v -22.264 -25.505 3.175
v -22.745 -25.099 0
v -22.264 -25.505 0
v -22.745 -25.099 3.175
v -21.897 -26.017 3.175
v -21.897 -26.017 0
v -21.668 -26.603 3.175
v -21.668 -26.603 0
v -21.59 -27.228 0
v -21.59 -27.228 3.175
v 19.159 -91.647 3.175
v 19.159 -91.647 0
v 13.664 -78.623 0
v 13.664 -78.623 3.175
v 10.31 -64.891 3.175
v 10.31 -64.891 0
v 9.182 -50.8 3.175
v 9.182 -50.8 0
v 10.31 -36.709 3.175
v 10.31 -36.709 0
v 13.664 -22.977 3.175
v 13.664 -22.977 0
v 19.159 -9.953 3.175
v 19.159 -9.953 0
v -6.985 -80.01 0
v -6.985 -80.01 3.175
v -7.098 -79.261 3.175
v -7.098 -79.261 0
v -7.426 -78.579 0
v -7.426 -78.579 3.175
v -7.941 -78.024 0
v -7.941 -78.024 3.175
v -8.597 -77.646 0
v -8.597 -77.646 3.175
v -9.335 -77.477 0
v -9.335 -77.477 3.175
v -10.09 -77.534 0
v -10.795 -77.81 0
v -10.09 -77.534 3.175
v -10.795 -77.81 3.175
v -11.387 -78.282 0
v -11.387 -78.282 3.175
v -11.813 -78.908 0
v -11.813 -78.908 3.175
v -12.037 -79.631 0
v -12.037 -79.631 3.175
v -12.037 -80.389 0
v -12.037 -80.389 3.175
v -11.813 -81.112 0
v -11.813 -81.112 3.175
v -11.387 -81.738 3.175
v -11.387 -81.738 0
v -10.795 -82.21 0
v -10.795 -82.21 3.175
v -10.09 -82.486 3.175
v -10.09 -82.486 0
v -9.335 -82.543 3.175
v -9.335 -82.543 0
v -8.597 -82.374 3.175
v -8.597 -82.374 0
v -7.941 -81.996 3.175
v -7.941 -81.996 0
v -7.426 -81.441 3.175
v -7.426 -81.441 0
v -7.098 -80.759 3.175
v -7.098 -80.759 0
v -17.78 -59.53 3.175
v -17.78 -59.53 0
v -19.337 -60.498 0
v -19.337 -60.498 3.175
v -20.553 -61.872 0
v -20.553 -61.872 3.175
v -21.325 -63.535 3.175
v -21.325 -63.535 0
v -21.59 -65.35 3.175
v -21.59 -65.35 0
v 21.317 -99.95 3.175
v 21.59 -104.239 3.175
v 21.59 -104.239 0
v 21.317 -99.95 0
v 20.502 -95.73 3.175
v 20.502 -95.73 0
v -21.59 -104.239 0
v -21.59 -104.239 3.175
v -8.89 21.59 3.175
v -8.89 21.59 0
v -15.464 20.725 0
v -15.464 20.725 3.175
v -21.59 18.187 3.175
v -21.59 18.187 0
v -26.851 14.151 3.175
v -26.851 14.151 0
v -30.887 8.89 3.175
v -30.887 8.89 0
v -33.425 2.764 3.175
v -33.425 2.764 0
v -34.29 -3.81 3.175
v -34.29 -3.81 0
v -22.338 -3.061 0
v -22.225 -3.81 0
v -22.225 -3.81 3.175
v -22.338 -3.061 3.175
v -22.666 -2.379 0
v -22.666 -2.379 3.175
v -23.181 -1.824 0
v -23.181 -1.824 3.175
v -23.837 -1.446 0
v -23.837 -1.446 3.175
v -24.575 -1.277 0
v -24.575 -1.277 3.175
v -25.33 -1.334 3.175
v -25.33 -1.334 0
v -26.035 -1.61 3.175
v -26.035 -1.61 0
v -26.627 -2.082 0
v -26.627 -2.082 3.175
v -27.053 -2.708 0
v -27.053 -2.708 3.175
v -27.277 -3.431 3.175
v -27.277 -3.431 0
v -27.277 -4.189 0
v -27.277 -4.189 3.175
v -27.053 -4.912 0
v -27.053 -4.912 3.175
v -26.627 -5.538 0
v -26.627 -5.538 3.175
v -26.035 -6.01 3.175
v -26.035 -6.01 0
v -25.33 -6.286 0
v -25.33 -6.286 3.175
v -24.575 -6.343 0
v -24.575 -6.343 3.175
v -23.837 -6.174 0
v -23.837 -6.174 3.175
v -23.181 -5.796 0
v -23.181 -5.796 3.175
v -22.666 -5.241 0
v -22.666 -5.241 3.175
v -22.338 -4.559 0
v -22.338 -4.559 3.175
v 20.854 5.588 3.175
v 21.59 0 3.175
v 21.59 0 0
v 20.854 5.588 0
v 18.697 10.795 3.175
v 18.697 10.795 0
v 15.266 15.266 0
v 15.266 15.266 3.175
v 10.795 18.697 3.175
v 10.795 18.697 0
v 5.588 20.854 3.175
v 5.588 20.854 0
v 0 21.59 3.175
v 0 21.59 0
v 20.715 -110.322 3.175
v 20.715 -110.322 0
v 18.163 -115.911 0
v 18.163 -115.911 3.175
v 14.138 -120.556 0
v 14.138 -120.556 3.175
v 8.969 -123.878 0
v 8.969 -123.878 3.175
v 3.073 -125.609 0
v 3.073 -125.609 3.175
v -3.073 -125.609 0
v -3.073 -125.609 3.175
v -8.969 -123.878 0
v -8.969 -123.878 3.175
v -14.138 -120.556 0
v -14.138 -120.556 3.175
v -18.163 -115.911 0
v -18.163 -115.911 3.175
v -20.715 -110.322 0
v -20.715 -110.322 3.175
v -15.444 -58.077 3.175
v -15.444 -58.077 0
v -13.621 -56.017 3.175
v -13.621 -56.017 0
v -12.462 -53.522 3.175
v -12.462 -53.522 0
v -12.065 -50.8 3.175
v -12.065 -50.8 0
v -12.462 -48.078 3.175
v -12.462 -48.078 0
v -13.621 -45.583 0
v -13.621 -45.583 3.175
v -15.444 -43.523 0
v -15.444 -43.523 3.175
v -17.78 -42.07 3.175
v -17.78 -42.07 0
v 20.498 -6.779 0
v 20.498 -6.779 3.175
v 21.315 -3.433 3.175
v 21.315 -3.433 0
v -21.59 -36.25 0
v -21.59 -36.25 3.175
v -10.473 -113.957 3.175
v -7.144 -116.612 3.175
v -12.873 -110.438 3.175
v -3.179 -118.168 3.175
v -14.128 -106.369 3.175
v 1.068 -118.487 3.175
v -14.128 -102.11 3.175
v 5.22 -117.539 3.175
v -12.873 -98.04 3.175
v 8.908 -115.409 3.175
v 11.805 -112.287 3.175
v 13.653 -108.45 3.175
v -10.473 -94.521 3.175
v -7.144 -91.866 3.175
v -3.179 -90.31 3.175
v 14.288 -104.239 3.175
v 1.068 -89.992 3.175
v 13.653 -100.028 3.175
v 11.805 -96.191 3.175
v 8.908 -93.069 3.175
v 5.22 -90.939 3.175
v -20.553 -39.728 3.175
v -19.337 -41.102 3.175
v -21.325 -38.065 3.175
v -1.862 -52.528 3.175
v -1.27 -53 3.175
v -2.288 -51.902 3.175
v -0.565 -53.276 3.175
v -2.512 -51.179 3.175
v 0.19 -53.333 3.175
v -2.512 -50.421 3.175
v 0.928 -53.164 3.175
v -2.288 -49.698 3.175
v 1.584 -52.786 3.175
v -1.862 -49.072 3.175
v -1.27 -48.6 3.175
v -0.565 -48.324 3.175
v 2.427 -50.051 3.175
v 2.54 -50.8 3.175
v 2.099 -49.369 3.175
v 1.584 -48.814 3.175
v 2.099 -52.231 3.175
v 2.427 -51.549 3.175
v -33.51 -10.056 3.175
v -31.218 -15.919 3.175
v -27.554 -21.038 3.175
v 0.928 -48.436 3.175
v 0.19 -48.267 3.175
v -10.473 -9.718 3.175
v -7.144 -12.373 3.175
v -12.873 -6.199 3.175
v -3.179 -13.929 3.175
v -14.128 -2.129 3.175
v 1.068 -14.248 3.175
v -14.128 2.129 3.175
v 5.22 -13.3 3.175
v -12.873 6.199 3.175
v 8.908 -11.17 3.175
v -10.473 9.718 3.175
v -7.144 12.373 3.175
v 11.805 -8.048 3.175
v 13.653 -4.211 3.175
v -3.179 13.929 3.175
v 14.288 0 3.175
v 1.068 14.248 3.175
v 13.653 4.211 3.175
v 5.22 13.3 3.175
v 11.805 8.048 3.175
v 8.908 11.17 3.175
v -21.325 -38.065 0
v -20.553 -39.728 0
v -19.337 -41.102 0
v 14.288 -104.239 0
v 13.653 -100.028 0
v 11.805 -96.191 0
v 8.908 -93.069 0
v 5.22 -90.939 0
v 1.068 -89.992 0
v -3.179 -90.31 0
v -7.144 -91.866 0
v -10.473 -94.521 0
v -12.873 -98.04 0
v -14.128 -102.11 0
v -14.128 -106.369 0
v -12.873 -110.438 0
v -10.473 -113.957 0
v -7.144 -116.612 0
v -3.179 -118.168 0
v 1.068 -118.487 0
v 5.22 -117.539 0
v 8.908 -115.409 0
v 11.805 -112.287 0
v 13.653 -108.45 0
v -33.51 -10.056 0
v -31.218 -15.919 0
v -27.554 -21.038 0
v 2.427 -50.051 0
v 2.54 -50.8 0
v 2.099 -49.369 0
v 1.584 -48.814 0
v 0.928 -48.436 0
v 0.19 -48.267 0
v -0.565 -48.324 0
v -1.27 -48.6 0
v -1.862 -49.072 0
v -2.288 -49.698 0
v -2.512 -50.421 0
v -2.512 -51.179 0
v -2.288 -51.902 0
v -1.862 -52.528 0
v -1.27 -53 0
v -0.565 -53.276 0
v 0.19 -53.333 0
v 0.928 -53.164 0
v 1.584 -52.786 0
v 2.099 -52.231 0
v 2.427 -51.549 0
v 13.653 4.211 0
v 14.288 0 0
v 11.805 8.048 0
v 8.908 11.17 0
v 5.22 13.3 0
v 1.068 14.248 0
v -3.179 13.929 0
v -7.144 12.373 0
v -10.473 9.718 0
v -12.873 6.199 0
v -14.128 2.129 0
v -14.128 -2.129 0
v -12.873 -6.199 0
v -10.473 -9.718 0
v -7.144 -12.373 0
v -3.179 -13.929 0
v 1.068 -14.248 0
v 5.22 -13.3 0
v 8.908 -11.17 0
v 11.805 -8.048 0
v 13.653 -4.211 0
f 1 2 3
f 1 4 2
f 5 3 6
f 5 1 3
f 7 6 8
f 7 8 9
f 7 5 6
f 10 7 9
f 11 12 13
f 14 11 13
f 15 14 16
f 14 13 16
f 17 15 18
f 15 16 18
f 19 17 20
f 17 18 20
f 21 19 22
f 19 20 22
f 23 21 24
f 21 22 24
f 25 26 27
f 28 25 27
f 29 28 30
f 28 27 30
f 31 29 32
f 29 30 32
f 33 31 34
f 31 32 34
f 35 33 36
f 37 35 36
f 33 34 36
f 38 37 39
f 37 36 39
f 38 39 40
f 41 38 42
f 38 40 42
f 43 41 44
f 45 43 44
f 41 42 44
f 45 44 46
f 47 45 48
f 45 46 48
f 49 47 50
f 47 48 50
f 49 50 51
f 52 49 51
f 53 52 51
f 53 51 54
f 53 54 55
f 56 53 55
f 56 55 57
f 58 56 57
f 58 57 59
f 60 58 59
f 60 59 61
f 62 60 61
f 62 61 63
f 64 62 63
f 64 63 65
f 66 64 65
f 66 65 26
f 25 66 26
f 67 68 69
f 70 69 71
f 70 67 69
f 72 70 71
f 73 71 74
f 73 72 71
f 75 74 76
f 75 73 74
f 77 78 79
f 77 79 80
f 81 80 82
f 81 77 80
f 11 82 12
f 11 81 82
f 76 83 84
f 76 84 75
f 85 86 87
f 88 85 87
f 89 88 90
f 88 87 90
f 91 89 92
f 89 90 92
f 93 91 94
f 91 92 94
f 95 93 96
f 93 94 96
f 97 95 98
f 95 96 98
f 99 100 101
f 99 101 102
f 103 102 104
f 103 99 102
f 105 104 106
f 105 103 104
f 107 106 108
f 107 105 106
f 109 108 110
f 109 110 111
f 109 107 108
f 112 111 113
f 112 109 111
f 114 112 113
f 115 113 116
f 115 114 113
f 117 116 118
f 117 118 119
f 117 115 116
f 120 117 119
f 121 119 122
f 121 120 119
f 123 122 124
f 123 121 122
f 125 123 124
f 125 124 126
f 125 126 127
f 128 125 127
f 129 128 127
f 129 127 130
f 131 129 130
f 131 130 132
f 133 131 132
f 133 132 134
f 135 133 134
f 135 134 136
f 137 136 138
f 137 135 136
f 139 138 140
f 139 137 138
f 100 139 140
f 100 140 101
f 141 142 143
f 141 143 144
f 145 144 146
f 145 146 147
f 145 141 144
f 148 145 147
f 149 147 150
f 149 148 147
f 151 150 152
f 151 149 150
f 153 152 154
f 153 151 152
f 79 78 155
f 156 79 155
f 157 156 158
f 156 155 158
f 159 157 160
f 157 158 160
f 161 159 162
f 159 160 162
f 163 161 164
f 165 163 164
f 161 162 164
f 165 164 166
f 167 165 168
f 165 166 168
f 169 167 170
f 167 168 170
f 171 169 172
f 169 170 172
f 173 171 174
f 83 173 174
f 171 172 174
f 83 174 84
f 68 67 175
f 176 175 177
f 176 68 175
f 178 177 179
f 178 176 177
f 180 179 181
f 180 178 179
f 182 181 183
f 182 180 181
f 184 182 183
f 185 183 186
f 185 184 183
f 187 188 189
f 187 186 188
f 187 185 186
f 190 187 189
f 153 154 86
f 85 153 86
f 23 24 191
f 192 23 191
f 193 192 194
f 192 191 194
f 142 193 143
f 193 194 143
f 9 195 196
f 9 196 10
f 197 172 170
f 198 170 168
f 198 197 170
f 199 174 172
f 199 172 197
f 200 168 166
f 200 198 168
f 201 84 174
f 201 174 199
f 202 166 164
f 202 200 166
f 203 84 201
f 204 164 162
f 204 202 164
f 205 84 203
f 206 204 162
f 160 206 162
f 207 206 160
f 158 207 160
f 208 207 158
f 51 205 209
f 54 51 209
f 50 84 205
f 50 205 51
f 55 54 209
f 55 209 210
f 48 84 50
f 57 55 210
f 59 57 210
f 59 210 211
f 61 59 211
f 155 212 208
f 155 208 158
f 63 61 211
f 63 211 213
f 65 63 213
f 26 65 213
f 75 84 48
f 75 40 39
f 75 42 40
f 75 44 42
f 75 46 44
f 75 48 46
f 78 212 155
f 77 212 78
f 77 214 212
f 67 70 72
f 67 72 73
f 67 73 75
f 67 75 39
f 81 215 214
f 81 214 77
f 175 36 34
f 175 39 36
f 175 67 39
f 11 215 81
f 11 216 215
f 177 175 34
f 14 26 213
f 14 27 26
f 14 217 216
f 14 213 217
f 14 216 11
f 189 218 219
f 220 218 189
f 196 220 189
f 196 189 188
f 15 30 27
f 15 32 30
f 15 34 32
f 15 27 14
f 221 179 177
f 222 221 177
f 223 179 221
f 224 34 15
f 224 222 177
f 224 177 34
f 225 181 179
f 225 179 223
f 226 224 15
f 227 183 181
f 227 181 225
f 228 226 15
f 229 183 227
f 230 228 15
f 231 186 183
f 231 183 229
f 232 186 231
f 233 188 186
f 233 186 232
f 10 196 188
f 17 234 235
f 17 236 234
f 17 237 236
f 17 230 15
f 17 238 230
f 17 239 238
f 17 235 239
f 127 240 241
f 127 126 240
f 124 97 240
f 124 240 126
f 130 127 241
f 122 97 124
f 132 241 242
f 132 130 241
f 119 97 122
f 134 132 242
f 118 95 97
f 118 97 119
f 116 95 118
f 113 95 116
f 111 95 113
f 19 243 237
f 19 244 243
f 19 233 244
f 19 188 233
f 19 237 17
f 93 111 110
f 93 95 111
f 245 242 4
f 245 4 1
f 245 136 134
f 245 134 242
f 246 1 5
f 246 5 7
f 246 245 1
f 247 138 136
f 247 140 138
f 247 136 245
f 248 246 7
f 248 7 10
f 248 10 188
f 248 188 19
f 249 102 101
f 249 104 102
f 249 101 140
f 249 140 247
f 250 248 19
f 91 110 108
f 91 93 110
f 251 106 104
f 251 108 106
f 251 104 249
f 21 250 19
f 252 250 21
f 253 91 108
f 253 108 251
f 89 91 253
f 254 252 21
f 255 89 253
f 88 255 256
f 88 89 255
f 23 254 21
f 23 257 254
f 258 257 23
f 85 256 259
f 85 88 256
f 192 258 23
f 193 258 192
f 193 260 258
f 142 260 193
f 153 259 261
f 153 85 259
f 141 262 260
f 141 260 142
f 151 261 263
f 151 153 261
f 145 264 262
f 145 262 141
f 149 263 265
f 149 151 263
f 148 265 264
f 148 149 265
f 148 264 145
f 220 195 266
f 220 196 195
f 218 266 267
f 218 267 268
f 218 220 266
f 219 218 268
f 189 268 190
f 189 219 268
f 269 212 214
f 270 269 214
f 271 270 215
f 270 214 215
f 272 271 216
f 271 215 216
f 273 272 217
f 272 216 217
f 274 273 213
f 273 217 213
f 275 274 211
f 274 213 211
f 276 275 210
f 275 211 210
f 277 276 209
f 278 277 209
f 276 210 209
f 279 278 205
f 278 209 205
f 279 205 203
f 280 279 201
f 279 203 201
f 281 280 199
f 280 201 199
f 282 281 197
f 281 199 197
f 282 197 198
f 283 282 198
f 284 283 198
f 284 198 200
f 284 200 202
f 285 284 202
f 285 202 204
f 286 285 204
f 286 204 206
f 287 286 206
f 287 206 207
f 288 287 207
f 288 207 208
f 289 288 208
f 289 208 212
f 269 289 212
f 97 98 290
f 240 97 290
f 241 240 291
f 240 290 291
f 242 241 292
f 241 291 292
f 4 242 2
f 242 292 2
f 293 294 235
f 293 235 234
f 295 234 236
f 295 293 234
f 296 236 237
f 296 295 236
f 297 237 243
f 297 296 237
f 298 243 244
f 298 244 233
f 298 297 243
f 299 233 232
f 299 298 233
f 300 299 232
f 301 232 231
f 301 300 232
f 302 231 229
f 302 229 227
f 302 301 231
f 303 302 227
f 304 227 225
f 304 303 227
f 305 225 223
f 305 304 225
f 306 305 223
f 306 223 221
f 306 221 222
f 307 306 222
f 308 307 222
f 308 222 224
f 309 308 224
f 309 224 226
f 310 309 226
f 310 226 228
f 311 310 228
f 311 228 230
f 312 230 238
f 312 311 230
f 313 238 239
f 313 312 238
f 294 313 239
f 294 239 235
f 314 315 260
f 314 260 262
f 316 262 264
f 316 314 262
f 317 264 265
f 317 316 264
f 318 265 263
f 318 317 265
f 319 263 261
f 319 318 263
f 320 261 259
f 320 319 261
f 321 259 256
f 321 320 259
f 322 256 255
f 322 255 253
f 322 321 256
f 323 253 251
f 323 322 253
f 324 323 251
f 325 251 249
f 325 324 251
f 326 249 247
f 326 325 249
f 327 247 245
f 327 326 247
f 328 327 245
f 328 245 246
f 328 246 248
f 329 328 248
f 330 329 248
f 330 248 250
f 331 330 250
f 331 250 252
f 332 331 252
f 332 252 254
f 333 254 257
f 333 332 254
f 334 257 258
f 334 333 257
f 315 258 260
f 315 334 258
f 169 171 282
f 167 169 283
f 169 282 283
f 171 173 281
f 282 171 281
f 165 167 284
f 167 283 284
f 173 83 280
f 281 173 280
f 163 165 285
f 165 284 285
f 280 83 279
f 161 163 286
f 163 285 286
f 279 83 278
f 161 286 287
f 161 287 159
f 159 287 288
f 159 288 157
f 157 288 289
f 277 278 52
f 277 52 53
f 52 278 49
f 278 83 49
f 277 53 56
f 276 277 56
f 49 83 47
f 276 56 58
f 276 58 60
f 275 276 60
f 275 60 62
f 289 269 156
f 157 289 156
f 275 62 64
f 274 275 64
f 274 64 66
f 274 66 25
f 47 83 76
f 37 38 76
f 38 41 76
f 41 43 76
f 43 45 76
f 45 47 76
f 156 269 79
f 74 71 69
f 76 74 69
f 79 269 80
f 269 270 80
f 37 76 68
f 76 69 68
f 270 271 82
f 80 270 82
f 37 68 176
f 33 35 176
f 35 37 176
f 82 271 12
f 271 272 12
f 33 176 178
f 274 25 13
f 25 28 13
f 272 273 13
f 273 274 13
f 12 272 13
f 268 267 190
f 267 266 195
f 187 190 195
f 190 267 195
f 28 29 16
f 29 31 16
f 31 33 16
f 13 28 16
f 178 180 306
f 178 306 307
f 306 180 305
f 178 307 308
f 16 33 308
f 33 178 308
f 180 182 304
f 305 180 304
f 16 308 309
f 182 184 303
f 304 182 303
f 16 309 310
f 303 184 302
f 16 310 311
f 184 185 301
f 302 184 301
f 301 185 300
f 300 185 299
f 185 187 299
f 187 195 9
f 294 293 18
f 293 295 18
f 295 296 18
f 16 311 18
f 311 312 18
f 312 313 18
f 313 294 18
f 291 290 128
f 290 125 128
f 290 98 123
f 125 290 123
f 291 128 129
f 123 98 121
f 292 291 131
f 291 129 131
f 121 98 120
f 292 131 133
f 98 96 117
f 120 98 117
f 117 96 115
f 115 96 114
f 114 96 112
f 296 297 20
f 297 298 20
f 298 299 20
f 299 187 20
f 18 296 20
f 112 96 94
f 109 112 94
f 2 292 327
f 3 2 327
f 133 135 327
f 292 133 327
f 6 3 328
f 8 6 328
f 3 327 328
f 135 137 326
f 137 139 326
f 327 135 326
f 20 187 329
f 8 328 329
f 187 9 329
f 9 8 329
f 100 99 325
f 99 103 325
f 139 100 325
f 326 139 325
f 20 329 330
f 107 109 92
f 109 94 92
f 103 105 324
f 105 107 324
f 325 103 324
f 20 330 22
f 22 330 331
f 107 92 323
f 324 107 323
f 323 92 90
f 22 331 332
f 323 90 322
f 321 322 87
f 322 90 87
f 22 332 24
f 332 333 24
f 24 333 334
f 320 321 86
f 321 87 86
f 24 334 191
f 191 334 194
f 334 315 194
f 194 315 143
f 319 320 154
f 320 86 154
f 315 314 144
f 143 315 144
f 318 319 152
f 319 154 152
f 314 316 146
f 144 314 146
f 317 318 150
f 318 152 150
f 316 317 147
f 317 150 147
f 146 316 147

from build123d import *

# Parameters (mm, degrees)
SKETCH1_R            = 14.2875
SKETCH1_R_2          = 2.54
BOSS_EXTRUDE1_DEPTH  = 3.175
CUT_EXTRUDE1_DEPTH   = 162.674043733
FILLET3_R            = 6.35
BOSS_EXTRUDE3_START  = -3.175
SKETCH3_R            = 2.54
BOSS_EXTRUDE3_DEPTH  = 3.175
SKETCH6_R            = 2.54
BOSS_EXTRUDE4_DEPTH  = 3.175
FILLET2_R            = 6.35
CUT_EXTRUDE2_DEPTH   = 168.423732074
CUT_EXTRUDE3_DEPTH   = 168.423732074
CUT_EXTRUDE4_DEPTH   = 168.265702461
BOSS_EXTRUDE8_START  = -3.175
SKETCH15_R           = 2.54
BOSS_EXTRUDE8_DEPTH  = 3.175
FILLET4_R            = 2.54
BOSS_EXTRUDE9_DEPTH  = 3.175
SKETCH17_R           = 14.2875
BOSS_EXTRUDE10_DEPTH = 3.175
CUT_EXTRUDE5_DEPTH   = 131.456264953
SKETCH20_R           = 14.2875
CUT_EXTRUDE6_DEPTH   = 131.456264953
SKETCH21_R           = 2.54
CUT_EXTRUDE7_DEPTH   = 131.456264953


with BuildPart() as part:
    # Sketch1 → Boss-Extrude1 (new body)
    with BuildSketch(Plane.XY):
        with BuildLine():
            Line((-8.89, 25.4), (8.89, 25.4))
            ThreePointArc((8.89, 25.4), (17.870256121, 21.680256121), (21.59, 12.7))
            Line((21.59, 12.7), (21.59, -117.775079775))
            ThreePointArc((21.59, -117.775079775), (21.127743647, -120.388718212), (19.797058824, -122.685251408))
            Line((19.797058824, -122.685251408), (-7.952696208, -155.616779465))
            ThreePointArc((-7.952696208, -155.616779465), (-12.268297602, -157.851943494), (-16.900388255, -156.380852124))
            Line((-16.900388255, -156.380852124), (-32.439211784, -143.287061102))
            ThreePointArc((-32.439211784, -143.287061102), (-34.674375812, -138.971459708), (-33.203284443, -134.339369055))
            Line((-33.203284443, -134.339369055), (-23.382941176, -122.685251408))
            ThreePointArc((-23.382941176, -122.685251408), (-22.052256353, -120.388718212), (-21.59, -117.775079775))
            Line((-21.59, -117.775079775), (-21.59, 12.7))
            ThreePointArc((-21.59, 12.7), (-17.870256121, 21.680256121), (-8.89, 25.4))
        make_face()
        Circle(SKETCH1_R, mode=Mode.SUBTRACT)
        with Locations((0, -101.6)):
            Circle(SKETCH1_R, mode=Mode.SUBTRACT)
        with Locations((-18.532085478, -142.550133084)):
            Circle(SKETCH1_R_2, mode=Mode.SUBTRACT)
        with Locations((0, -50.8)):
            Circle(SKETCH1_R_2, mode=Mode.SUBTRACT)
    extrude(amount=BOSS_EXTRUDE1_DEPTH)

    # Sketch2 → Cut-Extrude1 (cut, through all)
    with BuildSketch(Plane.XY):
        with BuildLine():
            ThreePointArc((19.159083004, -91.647229609), (9.182340769, -50.8), (19.159083004, -9.952770391))
            ThreePointArc((19.159083004, -9.952770391), (20.973467787, -5.122670102), (21.59, 0))
            Line((21.59, 0), (27.94, 0))
            Line((27.94, 0), (27.94, -121.656687185))
            Line((27.94, -121.656687185), (-7.789552878, -164.05809836))
            Line((-7.789552878, -164.05809836), (-17.501317584, -155.874478972))
            Line((-17.501317584, -155.874478972), (16.51, -115.512152961))
            ThreePointArc((16.51, -115.512152961), (20.280273667, -109.005308906), (21.59, -101.6))
            ThreePointArc((21.59, -101.6), (20.973467787, -96.477329898), (19.159083004, -91.647229609))
        make_face()
        with BuildLine():
            Line((-21.59, -41.275), (-21.59, -60.325))
            ThreePointArc((-21.59, -60.325), (-12.065, -50.8), (-21.59, -41.275))
        make_face()
    extrude(amount=CUT_EXTRUDE1_DEPTH, mode=Mode.SUBTRACT)

    # Fillet3
    fillet3_edges = [part.edges().sort_by_distance(p)[0] for p in [
        (-21.59, -41.275, 1.5875),
        (-21.59, -60.325, 1.5875),
    ]]
    fillet(fillet3_edges, radius=FILLET3_R)

    # Sketch3 → Boss-Extrude3 (add)
    with BuildSketch(Plane.XY.offset(3.175).offset(BOSS_EXTRUDE3_START)):
        with BuildLine():
            Line((-27.351416194, -127.394768527), (-36.025496499, -137.688579))
            ThreePointArc((-36.025496499, -137.688579), (-37.217489152, -141.441859142), (-35.4063854, -144.93869507))
            Line((-35.4063854, -144.93869507), (-24.403104784, -154.210610454))
            ThreePointArc((-24.403104784, -154.210610454), (-19.771014132, -155.681701823), (-15.455412737, -153.446537795))
            Line((-15.455412737, -153.446537795), (-7.557639641, -144.073996091))
            Line((-7.557639641, -144.073996091), (-27.351416194, -127.394768527))
        make_face()
        with Locations((-18.532085478, -142.550133084)):
            Circle(SKETCH3_R, mode=Mode.SUBTRACT)
    extrude(amount=BOSS_EXTRUDE3_DEPTH)

    # Sketch6 → Boss-Extrude4 (add)
    with BuildSketch(Plane.XY.offset(3.175)):
        Polygon((-35.4063854, -144.93869507), (-63.620410749, -121.164144113), (-51.344981666, -106.596497054), (-27.065569901, -127.055545526), align=None)
        with Locations((-52.626813855, -117.972130278)):
            Circle(SKETCH6_R, mode=Mode.SUBTRACT)
    extrude(amount=-BOSS_EXTRUDE4_DEPTH)

    # Fillet2
    fillet2_edges = [part.edges().sort_by_distance(p)[0] for p in [
        (-63.620410749, -121.164144113, 1.5875),
        (-51.344981666, -106.596497054, 1.5875),
        (-27.065569901, -127.055545526, 1.5875),
    ]]
    fillet(fillet2_edges, radius=FILLET2_R)

    # Sketch7 → Cut-Extrude2 (cut, through all)
    with BuildSketch(Plane.XY.offset(3.175)):
        with BuildLine():
            Line((-21.59, 0), (-21.59, 31.75))
            Line((-21.59, 31.75), (21.59, 31.75))
            Line((21.59, 31.75), (21.59, 0))
            ThreePointArc((21.59, 0), (0, 21.59), (-21.59, 0))
        make_face()
    extrude(amount=-CUT_EXTRUDE2_DEPTH, mode=Mode.SUBTRACT)

    # Sketch10 → Cut-Extrude3 (cut, through all)
    with BuildSketch(Plane.XY.offset(3.175)):
        with BuildLine():
            Line((-18.151882461, -155.32628042), (-17.361482582, -157.512020269))
            Line((-17.361482582, -157.512020269), (-14.375706423, -156.432313955))
            Line((-14.375706423, -156.432313955), (-15.455412737, -153.446537795))
            ThreePointArc((-15.455412737, -153.446537795), (-16.679911193, -154.563907595), (-18.151882461, -155.32628042))
        make_face()
    extrude(amount=-CUT_EXTRUDE3_DEPTH, mode=Mode.SUBTRACT)

    # Sketch12 → Cut-Extrude4 (cut, through all)
    with BuildSketch(Plane.XY.offset(3.175)):
        with BuildLine():
            Line((-21.59, -101.6), (-72.39, -101.6))
            Line((-72.39, -101.6), (-72.39, -165.1))
            Line((-72.39, -165.1), (16.51, -165.1))
            Line((16.51, -165.1), (16.51, -115.512152961))
            ThreePointArc((16.51, -115.512152961), (-7.405308906, -121.880273667), (-21.59, -101.6))
        make_face()
    extrude(amount=-CUT_EXTRUDE4_DEPTH, mode=Mode.SUBTRACT)

    # Sketch15 → Boss-Extrude8 (add)
    with BuildSketch(Plane.XY.offset(3.175).offset(BOSS_EXTRUDE8_START)):
        with BuildLine():
            ThreePointArc((-34.29, -3.81), (-30.887045256, -16.51), (-21.59, -25.807045256))
            Line((-21.59, -25.807045256), (-21.59, 0))
            ThreePointArc((-21.59, 0), (-15.266435406, 15.266435406), (0, 21.59))
            Line((0, 21.59), (-8.89, 21.59))
            ThreePointArc((-8.89, 21.59), (-26.850512242, 14.150512242), (-34.29, -3.81))
        make_face()
        with Locations((-24.765, -3.81)):
            Circle(SKETCH15_R, mode=Mode.SUBTRACT)
    extrude(amount=BOSS_EXTRUDE8_DEPTH)

    # Fillet4
    fillet4_edges = [part.edges().sort_by_distance(p)[0] for p in [
        (-21.59, -25.807045256, 1.5875),
    ]]
    fillet(fillet4_edges, radius=FILLET4_R)

    # Sketch16 → Boss-Extrude9 (add, through all)
    with BuildSketch(Plane.XY.offset(3.175)):
        with BuildLine():
            Line((-21.59, -101.6), (-1.489522905, -121.700477095))
            Line((-1.489522905, -121.700477095), (4.517920132, -121.700477095))
            Line((4.517920132, -121.700477095), (21.59, -101.6))
            Line((21.59, -101.6), (21.59, -104.23906))
            ThreePointArc((21.59, -104.23906), (0, -125.82906), (-21.59, -104.23906))
            Line((-21.59, -104.23906), (-21.59, -101.6))
        make_face()
    extrude(amount=-BOSS_EXTRUDE9_DEPTH)

    # Sketch17 → Boss-Extrude10 (add, through all)
    with BuildSketch(Plane.XY.offset(3.175)):
        with Locations((0, -101.6)):
            Circle(SKETCH17_R)
    extrude(amount=-BOSS_EXTRUDE10_DEPTH)

    # Sketch19 → Cut-Extrude5 (cut, through all)
    with BuildSketch(Plane.XY.offset(3.175)):
        with BuildLine():
            Line((19.159083004, -91.647229609), (21.59, -91.647229609))
            Line((21.59, -91.647229609), (21.59, -104.23906))
            ThreePointArc((21.59, -104.23906), (20.97671132, -97.826892854), (19.159083004, -91.647229609))
        make_face()
    extrude(amount=-CUT_EXTRUDE5_DEPTH, mode=Mode.SUBTRACT)

    # Sketch20 → Cut-Extrude6 (cut, through all)
    with BuildSketch(Plane.XY.offset(3.175)):
        with Locations((0, -104.23906)):
            Circle(SKETCH20_R)
    extrude(amount=-CUT_EXTRUDE6_DEPTH, mode=Mode.SUBTRACT)

    # Sketch21 → Cut-Extrude7 (cut, through all)
    with BuildSketch(Plane.XY.offset(3.175)):
        with Locations((-9.525, -80.01)):
            Circle(SKETCH21_R)
    extrude(amount=-CUT_EXTRUDE7_DEPTH, mode=Mode.SUBTRACT)


solid = part.part
